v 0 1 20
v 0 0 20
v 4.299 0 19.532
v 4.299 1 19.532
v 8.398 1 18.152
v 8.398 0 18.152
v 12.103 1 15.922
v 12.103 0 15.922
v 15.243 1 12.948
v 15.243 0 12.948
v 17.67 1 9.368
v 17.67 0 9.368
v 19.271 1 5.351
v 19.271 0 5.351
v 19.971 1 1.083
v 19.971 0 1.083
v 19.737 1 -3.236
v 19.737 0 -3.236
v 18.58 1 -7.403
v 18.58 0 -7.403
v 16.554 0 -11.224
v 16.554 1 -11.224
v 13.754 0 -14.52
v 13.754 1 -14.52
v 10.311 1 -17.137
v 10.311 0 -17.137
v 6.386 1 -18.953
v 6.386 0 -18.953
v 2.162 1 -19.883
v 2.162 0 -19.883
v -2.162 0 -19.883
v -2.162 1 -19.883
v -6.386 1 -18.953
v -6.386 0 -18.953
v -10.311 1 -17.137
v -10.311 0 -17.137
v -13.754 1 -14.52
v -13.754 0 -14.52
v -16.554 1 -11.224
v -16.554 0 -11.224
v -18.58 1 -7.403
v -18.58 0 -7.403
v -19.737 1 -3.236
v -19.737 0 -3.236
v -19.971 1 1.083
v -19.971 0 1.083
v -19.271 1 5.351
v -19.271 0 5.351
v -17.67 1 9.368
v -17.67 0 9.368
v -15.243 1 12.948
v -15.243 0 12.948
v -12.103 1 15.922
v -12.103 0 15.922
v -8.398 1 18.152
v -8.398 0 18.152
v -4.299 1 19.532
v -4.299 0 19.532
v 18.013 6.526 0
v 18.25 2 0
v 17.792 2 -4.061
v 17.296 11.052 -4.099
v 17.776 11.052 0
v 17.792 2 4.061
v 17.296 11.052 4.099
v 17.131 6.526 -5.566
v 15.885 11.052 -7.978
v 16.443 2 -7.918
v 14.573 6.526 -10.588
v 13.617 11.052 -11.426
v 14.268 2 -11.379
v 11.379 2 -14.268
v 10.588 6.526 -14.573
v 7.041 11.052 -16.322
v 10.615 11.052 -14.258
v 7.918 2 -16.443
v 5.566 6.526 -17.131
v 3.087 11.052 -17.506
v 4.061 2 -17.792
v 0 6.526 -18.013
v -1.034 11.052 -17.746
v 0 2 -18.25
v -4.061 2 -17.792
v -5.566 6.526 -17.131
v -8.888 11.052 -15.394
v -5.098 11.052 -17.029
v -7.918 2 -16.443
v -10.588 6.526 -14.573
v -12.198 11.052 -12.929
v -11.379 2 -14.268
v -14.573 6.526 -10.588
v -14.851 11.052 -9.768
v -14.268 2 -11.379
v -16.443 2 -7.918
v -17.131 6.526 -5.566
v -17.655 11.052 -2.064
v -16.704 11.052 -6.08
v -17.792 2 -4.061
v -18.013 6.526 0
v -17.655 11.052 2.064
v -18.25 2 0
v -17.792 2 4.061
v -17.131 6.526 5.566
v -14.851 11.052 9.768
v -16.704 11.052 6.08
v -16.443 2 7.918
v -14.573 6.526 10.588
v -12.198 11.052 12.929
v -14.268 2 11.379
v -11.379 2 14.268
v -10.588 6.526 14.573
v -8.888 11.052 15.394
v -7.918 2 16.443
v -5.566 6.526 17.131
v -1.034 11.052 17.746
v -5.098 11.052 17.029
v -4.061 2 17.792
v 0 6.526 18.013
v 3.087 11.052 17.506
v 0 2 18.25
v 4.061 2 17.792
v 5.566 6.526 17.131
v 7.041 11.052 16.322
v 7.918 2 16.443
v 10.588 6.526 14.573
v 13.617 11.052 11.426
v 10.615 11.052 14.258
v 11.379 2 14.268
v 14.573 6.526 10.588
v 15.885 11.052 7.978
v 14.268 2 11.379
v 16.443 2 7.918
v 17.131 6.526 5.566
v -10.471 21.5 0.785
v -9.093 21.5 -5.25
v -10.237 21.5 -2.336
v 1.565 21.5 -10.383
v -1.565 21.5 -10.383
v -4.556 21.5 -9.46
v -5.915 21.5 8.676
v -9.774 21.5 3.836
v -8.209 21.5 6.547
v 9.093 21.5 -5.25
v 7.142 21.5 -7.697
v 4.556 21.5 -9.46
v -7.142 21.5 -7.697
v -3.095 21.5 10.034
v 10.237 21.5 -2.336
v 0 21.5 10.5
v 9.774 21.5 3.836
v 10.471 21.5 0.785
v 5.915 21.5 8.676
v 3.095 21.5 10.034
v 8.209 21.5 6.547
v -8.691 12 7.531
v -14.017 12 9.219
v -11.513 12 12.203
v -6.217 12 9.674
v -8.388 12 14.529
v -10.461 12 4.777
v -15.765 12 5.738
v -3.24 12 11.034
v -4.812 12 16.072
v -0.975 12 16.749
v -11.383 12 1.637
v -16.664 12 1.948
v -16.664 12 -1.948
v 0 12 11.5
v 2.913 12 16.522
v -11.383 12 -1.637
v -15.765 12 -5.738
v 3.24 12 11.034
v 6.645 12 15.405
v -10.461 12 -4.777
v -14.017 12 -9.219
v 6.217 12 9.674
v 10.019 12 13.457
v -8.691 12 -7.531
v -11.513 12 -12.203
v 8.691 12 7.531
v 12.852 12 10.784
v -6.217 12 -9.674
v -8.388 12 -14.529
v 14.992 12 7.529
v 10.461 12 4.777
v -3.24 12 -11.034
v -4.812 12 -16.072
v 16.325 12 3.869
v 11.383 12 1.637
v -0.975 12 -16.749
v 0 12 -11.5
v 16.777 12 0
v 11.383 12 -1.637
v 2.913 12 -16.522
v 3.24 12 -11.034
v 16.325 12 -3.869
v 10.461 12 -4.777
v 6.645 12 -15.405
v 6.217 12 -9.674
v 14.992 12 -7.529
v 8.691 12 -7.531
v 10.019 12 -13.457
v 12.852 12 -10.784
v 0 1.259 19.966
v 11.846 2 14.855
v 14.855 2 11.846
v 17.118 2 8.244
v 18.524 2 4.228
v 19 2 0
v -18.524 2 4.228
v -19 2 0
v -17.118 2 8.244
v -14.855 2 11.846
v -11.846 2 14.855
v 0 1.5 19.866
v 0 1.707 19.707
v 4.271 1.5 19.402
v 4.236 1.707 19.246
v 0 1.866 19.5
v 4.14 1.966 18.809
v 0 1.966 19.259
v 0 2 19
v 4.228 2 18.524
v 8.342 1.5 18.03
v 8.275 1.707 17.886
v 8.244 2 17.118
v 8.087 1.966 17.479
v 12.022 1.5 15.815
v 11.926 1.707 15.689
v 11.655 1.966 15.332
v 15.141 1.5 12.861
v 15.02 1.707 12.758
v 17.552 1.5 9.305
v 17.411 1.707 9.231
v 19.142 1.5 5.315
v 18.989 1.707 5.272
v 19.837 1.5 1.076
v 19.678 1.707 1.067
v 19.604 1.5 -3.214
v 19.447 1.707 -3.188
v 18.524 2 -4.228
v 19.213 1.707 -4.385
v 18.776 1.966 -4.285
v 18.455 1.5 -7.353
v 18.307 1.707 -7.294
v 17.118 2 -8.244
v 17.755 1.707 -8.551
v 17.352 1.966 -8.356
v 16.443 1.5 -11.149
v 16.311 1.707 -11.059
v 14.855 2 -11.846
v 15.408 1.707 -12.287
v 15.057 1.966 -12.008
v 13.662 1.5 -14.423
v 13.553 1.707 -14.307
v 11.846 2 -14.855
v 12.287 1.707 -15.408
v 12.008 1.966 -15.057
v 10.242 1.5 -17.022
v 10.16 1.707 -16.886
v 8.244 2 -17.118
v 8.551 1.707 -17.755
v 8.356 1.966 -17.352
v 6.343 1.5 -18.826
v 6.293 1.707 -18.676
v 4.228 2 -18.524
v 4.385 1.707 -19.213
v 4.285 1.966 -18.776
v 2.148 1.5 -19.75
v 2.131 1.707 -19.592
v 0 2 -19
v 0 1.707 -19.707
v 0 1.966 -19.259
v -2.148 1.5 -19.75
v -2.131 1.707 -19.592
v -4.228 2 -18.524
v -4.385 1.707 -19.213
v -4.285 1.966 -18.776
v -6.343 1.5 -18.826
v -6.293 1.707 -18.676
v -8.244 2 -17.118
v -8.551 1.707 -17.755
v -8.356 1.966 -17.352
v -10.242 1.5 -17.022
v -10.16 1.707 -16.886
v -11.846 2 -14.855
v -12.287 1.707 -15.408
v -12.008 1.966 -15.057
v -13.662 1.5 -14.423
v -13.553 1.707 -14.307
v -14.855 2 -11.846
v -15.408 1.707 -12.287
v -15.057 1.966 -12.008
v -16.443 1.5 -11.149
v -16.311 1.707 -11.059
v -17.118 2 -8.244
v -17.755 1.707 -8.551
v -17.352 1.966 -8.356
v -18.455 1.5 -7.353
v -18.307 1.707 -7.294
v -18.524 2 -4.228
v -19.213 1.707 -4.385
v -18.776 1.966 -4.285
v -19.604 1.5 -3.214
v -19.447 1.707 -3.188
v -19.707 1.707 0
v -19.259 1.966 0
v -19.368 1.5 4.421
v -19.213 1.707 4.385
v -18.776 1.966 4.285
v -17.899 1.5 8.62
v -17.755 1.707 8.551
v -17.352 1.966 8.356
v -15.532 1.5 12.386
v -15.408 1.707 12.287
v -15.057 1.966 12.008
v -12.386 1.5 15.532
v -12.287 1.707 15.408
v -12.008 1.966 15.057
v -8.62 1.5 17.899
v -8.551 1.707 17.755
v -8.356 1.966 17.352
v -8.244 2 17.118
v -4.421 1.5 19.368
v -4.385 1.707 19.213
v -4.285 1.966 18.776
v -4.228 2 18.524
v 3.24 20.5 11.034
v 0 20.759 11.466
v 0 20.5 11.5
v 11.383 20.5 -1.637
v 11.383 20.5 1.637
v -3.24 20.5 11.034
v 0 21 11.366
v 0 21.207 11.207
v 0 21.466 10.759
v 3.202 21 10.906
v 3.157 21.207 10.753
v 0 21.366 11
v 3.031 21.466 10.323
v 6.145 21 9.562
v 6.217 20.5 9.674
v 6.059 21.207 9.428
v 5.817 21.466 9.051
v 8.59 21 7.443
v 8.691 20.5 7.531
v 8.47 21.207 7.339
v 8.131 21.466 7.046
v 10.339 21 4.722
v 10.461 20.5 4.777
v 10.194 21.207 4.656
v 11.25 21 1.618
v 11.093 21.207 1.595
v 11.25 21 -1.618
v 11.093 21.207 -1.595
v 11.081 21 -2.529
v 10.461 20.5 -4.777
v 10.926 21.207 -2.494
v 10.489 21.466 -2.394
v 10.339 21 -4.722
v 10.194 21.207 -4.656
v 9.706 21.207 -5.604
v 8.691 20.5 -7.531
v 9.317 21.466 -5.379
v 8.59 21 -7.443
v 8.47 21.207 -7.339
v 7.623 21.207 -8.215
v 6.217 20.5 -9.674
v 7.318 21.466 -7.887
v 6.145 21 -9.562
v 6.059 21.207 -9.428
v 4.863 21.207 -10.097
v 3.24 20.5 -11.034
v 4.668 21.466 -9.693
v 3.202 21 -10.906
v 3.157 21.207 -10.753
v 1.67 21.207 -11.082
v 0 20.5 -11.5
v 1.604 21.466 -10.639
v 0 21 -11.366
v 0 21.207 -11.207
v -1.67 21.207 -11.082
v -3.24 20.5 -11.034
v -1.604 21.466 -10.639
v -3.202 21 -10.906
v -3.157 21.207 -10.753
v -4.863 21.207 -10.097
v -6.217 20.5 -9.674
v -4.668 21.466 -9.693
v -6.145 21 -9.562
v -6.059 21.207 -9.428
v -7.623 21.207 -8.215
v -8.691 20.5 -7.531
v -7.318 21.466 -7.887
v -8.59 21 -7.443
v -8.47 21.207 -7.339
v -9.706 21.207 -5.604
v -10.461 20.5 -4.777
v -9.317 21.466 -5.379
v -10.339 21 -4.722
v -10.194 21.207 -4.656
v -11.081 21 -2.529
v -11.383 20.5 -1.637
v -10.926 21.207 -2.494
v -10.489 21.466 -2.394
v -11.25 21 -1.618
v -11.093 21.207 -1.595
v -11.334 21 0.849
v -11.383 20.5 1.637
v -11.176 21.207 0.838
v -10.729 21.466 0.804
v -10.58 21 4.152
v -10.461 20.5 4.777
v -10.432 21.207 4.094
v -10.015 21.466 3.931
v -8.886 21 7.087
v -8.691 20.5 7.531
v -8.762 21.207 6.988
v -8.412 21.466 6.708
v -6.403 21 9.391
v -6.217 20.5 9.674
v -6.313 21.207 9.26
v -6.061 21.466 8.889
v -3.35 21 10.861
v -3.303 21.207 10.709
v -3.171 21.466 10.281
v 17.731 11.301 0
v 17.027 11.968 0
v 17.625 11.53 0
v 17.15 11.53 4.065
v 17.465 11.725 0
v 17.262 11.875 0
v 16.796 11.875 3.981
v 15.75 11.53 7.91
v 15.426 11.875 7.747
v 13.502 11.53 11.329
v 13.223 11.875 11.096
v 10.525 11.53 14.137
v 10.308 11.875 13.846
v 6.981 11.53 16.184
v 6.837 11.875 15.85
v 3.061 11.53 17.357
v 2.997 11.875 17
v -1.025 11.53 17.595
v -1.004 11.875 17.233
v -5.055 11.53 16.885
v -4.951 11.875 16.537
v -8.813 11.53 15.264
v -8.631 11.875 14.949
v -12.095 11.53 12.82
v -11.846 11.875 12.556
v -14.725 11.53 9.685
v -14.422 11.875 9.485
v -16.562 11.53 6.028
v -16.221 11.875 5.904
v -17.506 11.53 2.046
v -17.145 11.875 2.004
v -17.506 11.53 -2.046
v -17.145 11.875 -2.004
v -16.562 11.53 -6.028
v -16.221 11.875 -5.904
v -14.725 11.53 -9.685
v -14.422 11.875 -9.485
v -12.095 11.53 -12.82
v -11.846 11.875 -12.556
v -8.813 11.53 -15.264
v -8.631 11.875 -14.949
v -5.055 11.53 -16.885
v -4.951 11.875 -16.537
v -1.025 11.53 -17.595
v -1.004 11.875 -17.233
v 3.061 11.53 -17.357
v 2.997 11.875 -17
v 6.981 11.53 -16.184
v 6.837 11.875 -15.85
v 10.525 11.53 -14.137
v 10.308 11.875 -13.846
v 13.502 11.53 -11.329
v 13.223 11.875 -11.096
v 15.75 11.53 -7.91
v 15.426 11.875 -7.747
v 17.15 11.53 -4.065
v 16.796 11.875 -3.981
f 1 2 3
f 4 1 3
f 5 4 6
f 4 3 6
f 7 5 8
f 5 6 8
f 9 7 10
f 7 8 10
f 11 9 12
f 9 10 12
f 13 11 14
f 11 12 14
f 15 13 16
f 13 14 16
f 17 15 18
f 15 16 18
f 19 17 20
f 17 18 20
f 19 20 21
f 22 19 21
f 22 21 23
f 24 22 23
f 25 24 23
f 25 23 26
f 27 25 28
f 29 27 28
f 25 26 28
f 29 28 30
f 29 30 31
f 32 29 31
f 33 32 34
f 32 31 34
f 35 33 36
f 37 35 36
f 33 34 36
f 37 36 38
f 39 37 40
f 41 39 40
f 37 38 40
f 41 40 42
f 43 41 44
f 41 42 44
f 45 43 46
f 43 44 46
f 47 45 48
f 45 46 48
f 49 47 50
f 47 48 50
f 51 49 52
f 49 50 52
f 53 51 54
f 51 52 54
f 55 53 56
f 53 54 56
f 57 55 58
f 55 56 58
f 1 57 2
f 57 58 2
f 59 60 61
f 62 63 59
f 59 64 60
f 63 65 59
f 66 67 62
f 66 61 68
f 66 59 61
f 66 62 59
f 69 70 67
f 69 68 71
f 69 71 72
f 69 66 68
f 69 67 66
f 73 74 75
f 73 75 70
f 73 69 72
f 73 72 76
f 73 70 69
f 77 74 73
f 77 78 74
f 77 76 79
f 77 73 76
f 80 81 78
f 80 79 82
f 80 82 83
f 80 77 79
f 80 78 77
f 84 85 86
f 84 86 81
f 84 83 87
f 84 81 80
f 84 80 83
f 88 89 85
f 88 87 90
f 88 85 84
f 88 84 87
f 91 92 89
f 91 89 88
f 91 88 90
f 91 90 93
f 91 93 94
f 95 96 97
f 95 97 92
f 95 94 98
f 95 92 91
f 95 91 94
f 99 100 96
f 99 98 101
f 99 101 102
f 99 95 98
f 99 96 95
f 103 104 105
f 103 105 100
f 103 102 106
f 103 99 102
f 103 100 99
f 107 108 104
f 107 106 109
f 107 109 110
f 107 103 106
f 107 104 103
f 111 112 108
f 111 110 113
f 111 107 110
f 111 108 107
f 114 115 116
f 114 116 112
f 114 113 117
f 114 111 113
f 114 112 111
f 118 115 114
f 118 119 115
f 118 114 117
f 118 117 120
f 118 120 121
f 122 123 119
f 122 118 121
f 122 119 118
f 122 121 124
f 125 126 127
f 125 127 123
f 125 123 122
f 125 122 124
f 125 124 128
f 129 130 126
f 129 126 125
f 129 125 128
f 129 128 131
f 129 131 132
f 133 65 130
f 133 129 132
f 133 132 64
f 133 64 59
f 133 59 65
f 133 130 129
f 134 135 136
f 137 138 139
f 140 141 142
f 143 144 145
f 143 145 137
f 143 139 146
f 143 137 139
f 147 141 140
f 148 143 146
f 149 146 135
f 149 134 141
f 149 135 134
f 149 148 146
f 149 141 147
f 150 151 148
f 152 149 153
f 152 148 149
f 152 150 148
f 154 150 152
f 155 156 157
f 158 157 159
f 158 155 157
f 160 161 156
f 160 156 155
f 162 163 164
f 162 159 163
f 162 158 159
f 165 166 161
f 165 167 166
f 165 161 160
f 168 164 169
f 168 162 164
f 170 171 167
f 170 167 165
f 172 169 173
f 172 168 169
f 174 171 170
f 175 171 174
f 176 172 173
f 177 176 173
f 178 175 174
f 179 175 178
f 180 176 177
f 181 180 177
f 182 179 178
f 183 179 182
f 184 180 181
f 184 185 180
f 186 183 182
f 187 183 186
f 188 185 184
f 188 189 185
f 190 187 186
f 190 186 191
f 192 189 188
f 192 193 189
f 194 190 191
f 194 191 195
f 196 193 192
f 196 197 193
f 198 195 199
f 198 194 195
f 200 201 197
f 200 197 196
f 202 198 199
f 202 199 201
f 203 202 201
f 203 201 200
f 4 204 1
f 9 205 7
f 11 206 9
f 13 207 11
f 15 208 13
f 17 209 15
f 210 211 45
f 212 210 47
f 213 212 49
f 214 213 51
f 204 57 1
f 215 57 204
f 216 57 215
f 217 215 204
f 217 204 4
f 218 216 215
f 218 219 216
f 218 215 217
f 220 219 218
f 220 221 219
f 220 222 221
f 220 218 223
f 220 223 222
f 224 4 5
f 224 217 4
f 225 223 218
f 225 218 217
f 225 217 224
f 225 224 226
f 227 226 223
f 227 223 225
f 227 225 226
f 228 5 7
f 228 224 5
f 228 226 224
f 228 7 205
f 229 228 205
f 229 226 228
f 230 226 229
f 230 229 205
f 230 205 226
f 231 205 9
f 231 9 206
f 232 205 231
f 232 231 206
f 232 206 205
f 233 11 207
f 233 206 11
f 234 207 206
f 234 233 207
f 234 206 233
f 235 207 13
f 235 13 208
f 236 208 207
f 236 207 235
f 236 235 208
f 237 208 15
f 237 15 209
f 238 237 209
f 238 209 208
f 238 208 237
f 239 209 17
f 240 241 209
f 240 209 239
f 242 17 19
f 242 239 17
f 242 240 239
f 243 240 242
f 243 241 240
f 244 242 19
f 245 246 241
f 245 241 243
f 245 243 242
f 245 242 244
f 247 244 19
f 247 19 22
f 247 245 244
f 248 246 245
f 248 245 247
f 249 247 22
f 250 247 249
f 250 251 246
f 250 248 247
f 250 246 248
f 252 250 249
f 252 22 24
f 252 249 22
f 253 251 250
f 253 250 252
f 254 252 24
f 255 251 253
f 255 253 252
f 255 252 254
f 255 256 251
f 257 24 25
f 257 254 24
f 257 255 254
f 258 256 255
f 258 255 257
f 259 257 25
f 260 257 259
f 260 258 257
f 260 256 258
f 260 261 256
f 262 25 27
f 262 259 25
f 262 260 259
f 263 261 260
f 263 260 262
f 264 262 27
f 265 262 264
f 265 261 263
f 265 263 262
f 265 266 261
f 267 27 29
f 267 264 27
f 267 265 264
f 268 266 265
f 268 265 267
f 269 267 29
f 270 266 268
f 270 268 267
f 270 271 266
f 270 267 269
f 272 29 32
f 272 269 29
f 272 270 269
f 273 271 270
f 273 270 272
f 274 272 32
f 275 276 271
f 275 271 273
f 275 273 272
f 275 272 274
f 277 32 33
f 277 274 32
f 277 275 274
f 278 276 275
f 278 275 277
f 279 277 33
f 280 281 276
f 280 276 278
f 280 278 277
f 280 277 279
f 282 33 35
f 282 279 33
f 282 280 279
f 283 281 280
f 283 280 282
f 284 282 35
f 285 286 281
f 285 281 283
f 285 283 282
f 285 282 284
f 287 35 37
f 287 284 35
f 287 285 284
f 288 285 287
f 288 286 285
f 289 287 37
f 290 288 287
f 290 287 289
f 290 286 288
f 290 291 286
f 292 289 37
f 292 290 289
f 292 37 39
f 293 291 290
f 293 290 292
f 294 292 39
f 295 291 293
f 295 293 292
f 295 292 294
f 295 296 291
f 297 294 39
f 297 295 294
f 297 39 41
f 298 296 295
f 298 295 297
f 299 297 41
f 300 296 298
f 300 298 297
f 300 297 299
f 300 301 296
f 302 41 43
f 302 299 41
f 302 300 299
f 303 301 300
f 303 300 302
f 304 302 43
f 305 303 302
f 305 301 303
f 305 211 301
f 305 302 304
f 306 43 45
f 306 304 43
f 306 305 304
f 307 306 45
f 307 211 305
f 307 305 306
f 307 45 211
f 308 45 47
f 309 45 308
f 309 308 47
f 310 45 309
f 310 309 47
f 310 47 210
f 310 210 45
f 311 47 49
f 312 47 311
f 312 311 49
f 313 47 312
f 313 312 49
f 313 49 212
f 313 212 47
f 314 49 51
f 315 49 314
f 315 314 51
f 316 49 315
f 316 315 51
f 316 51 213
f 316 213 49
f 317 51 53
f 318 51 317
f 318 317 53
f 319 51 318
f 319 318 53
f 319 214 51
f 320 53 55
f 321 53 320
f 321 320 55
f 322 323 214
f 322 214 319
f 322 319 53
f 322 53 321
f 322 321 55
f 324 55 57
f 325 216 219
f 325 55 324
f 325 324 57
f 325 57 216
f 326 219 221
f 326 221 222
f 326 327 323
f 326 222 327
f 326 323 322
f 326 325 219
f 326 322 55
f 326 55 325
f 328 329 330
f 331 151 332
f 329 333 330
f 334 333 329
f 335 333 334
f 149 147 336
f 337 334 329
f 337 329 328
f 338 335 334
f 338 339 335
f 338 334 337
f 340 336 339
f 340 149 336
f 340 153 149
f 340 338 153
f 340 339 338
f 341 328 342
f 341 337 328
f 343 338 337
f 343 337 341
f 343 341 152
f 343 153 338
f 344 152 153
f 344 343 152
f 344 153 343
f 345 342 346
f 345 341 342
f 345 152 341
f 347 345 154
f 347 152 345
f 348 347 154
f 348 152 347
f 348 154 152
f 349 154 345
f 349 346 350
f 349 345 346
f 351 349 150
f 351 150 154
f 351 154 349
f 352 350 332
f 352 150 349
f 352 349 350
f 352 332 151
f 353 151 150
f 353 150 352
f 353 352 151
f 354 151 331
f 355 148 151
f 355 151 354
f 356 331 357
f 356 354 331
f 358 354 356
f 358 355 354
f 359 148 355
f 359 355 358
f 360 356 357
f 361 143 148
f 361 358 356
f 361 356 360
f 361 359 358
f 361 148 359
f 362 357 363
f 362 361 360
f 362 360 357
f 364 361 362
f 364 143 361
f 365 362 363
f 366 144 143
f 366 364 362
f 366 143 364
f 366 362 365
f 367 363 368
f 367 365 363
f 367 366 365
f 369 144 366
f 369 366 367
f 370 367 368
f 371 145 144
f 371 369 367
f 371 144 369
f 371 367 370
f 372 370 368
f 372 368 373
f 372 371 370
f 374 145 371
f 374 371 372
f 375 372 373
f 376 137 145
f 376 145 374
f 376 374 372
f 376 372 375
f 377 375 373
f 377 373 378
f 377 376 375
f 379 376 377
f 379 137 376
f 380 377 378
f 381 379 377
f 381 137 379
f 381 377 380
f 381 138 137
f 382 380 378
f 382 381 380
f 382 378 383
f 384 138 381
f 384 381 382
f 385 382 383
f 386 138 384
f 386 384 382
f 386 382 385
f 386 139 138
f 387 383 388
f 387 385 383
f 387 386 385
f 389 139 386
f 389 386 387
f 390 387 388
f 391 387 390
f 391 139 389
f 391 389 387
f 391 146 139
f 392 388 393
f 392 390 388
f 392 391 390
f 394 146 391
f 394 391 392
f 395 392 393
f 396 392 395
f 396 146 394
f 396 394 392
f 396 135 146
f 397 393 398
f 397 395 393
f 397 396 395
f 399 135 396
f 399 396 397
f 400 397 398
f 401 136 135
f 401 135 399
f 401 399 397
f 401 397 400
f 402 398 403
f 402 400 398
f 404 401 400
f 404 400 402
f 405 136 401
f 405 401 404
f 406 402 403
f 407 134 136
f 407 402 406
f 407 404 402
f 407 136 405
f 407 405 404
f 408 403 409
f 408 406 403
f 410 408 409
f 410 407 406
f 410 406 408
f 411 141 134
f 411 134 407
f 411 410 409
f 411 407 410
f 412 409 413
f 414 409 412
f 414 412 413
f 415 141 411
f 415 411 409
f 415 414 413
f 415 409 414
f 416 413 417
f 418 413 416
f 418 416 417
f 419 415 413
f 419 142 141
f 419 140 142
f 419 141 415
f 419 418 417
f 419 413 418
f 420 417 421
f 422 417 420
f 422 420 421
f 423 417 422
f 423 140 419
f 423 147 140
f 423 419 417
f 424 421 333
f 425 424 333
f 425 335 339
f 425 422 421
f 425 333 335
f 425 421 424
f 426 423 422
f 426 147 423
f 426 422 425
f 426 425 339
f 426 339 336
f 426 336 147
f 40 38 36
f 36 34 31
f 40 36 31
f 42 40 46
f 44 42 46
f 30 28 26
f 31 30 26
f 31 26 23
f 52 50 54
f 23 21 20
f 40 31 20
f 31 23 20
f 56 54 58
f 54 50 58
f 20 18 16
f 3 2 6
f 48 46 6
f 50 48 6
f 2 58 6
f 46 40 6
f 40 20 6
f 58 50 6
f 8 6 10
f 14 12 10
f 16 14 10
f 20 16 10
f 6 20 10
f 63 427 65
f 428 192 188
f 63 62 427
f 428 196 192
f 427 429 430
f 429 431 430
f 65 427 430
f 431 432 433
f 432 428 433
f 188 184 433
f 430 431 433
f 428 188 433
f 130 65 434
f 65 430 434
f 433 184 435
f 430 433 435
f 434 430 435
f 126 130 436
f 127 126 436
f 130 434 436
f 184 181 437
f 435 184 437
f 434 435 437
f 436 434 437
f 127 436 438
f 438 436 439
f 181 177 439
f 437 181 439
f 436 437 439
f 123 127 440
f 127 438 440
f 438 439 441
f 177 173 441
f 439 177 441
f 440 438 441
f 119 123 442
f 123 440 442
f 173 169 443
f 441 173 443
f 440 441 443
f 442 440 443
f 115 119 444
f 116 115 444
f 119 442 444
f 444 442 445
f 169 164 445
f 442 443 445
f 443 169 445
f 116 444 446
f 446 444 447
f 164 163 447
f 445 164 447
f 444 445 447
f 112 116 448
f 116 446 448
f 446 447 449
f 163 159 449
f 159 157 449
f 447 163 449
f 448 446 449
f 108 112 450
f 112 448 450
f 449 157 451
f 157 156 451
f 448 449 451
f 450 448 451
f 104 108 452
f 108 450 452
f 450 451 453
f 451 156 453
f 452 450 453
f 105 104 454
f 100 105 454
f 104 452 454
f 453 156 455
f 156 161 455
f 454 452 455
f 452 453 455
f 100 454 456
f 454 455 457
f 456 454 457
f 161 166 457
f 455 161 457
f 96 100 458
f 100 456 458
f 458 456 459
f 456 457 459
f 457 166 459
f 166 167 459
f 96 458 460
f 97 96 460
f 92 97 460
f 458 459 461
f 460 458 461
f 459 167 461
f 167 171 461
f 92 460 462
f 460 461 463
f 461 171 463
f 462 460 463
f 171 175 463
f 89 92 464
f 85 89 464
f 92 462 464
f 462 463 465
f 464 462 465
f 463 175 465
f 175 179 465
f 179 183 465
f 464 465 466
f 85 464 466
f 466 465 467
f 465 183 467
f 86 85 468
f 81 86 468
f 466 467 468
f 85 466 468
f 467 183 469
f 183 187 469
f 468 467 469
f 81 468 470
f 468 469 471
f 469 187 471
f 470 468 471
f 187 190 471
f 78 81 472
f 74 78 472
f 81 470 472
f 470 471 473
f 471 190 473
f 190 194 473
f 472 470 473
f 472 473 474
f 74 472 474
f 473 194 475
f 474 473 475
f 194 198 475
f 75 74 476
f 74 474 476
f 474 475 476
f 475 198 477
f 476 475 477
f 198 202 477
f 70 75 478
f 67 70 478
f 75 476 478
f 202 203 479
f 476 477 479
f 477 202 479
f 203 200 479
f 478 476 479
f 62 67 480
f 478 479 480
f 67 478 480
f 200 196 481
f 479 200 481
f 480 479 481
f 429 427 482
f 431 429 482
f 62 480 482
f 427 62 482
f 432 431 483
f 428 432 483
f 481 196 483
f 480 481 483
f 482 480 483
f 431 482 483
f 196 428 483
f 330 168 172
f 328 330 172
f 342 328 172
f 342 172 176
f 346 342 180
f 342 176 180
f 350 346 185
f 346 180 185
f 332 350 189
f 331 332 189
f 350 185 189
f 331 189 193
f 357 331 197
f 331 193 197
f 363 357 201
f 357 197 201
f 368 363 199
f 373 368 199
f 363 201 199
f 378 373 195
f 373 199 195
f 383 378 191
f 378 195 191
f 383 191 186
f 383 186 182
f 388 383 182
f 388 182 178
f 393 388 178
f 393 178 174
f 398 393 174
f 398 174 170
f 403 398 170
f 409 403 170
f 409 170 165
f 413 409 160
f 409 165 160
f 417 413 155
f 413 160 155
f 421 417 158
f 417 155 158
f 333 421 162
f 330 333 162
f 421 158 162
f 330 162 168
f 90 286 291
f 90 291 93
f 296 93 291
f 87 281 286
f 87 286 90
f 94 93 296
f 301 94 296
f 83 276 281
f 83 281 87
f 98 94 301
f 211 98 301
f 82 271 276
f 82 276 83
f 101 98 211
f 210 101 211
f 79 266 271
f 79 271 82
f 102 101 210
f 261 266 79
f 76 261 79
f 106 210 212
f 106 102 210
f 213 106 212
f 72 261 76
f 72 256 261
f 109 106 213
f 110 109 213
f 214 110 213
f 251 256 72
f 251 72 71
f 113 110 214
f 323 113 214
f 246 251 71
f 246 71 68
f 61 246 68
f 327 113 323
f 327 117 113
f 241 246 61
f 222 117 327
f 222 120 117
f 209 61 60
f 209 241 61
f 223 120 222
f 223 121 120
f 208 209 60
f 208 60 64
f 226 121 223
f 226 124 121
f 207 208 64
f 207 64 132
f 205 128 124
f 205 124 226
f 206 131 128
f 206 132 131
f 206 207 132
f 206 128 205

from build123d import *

# Parameters (mm, degrees)
SKETCH1_R           = 20
BOSS_EXTRUDE1_DEPTH = 2
SKETCH2_R           = 18.25
BOSS_EXTRUDE2_DEPTH = 10
BOSS_EXTRUDE2_TAPER = 3
SKETCH3_R           = 11.5
BOSS_EXTRUDE3_DEPTH = 9.5
FILLET1_R           = 1


with BuildPart() as part:
    # Sketch1 → Boss-Extrude1 (new body)
    with BuildSketch(Plane(origin=(0, 0, 0), x_dir=(1, 0, 0), z_dir=(0, 1, 0))):
        with Locations(Location((0, 0, 0), (0, 0, 270))):
            Circle(SKETCH1_R)
    extrude(amount=BOSS_EXTRUDE1_DEPTH)

    # Sketch2 → Boss-Extrude2 (add)
    with BuildSketch(Plane(origin=(0, 2, 0), x_dir=(1, 0, 0), z_dir=(0, 1, 0))):
        Circle(SKETCH2_R)
    extrude(amount=BOSS_EXTRUDE2_DEPTH, taper=BOSS_EXTRUDE2_TAPER)

    # Sketch3 → Boss-Extrude3 (add)
    with BuildSketch(Plane(origin=(0, 12, 0), x_dir=(1, 0, 0), z_dir=(0, 1, 0))):
        with Locations(Location((0, 0, 0), (0, 0, 270))):
            Circle(SKETCH3_R)
    extrude(amount=BOSS_EXTRUDE3_DEPTH)

    # Fillet1
    fillet1_edges = [part.edges().sort_by_distance(p)[0] for p in [
        (0, 21.5, -11.5),
        (0, 2, -20),
        (-17.725922207, 12, 0),
    ]]
    fillet(fillet1_edges, radius=FILLET1_R)


solid = part.part
